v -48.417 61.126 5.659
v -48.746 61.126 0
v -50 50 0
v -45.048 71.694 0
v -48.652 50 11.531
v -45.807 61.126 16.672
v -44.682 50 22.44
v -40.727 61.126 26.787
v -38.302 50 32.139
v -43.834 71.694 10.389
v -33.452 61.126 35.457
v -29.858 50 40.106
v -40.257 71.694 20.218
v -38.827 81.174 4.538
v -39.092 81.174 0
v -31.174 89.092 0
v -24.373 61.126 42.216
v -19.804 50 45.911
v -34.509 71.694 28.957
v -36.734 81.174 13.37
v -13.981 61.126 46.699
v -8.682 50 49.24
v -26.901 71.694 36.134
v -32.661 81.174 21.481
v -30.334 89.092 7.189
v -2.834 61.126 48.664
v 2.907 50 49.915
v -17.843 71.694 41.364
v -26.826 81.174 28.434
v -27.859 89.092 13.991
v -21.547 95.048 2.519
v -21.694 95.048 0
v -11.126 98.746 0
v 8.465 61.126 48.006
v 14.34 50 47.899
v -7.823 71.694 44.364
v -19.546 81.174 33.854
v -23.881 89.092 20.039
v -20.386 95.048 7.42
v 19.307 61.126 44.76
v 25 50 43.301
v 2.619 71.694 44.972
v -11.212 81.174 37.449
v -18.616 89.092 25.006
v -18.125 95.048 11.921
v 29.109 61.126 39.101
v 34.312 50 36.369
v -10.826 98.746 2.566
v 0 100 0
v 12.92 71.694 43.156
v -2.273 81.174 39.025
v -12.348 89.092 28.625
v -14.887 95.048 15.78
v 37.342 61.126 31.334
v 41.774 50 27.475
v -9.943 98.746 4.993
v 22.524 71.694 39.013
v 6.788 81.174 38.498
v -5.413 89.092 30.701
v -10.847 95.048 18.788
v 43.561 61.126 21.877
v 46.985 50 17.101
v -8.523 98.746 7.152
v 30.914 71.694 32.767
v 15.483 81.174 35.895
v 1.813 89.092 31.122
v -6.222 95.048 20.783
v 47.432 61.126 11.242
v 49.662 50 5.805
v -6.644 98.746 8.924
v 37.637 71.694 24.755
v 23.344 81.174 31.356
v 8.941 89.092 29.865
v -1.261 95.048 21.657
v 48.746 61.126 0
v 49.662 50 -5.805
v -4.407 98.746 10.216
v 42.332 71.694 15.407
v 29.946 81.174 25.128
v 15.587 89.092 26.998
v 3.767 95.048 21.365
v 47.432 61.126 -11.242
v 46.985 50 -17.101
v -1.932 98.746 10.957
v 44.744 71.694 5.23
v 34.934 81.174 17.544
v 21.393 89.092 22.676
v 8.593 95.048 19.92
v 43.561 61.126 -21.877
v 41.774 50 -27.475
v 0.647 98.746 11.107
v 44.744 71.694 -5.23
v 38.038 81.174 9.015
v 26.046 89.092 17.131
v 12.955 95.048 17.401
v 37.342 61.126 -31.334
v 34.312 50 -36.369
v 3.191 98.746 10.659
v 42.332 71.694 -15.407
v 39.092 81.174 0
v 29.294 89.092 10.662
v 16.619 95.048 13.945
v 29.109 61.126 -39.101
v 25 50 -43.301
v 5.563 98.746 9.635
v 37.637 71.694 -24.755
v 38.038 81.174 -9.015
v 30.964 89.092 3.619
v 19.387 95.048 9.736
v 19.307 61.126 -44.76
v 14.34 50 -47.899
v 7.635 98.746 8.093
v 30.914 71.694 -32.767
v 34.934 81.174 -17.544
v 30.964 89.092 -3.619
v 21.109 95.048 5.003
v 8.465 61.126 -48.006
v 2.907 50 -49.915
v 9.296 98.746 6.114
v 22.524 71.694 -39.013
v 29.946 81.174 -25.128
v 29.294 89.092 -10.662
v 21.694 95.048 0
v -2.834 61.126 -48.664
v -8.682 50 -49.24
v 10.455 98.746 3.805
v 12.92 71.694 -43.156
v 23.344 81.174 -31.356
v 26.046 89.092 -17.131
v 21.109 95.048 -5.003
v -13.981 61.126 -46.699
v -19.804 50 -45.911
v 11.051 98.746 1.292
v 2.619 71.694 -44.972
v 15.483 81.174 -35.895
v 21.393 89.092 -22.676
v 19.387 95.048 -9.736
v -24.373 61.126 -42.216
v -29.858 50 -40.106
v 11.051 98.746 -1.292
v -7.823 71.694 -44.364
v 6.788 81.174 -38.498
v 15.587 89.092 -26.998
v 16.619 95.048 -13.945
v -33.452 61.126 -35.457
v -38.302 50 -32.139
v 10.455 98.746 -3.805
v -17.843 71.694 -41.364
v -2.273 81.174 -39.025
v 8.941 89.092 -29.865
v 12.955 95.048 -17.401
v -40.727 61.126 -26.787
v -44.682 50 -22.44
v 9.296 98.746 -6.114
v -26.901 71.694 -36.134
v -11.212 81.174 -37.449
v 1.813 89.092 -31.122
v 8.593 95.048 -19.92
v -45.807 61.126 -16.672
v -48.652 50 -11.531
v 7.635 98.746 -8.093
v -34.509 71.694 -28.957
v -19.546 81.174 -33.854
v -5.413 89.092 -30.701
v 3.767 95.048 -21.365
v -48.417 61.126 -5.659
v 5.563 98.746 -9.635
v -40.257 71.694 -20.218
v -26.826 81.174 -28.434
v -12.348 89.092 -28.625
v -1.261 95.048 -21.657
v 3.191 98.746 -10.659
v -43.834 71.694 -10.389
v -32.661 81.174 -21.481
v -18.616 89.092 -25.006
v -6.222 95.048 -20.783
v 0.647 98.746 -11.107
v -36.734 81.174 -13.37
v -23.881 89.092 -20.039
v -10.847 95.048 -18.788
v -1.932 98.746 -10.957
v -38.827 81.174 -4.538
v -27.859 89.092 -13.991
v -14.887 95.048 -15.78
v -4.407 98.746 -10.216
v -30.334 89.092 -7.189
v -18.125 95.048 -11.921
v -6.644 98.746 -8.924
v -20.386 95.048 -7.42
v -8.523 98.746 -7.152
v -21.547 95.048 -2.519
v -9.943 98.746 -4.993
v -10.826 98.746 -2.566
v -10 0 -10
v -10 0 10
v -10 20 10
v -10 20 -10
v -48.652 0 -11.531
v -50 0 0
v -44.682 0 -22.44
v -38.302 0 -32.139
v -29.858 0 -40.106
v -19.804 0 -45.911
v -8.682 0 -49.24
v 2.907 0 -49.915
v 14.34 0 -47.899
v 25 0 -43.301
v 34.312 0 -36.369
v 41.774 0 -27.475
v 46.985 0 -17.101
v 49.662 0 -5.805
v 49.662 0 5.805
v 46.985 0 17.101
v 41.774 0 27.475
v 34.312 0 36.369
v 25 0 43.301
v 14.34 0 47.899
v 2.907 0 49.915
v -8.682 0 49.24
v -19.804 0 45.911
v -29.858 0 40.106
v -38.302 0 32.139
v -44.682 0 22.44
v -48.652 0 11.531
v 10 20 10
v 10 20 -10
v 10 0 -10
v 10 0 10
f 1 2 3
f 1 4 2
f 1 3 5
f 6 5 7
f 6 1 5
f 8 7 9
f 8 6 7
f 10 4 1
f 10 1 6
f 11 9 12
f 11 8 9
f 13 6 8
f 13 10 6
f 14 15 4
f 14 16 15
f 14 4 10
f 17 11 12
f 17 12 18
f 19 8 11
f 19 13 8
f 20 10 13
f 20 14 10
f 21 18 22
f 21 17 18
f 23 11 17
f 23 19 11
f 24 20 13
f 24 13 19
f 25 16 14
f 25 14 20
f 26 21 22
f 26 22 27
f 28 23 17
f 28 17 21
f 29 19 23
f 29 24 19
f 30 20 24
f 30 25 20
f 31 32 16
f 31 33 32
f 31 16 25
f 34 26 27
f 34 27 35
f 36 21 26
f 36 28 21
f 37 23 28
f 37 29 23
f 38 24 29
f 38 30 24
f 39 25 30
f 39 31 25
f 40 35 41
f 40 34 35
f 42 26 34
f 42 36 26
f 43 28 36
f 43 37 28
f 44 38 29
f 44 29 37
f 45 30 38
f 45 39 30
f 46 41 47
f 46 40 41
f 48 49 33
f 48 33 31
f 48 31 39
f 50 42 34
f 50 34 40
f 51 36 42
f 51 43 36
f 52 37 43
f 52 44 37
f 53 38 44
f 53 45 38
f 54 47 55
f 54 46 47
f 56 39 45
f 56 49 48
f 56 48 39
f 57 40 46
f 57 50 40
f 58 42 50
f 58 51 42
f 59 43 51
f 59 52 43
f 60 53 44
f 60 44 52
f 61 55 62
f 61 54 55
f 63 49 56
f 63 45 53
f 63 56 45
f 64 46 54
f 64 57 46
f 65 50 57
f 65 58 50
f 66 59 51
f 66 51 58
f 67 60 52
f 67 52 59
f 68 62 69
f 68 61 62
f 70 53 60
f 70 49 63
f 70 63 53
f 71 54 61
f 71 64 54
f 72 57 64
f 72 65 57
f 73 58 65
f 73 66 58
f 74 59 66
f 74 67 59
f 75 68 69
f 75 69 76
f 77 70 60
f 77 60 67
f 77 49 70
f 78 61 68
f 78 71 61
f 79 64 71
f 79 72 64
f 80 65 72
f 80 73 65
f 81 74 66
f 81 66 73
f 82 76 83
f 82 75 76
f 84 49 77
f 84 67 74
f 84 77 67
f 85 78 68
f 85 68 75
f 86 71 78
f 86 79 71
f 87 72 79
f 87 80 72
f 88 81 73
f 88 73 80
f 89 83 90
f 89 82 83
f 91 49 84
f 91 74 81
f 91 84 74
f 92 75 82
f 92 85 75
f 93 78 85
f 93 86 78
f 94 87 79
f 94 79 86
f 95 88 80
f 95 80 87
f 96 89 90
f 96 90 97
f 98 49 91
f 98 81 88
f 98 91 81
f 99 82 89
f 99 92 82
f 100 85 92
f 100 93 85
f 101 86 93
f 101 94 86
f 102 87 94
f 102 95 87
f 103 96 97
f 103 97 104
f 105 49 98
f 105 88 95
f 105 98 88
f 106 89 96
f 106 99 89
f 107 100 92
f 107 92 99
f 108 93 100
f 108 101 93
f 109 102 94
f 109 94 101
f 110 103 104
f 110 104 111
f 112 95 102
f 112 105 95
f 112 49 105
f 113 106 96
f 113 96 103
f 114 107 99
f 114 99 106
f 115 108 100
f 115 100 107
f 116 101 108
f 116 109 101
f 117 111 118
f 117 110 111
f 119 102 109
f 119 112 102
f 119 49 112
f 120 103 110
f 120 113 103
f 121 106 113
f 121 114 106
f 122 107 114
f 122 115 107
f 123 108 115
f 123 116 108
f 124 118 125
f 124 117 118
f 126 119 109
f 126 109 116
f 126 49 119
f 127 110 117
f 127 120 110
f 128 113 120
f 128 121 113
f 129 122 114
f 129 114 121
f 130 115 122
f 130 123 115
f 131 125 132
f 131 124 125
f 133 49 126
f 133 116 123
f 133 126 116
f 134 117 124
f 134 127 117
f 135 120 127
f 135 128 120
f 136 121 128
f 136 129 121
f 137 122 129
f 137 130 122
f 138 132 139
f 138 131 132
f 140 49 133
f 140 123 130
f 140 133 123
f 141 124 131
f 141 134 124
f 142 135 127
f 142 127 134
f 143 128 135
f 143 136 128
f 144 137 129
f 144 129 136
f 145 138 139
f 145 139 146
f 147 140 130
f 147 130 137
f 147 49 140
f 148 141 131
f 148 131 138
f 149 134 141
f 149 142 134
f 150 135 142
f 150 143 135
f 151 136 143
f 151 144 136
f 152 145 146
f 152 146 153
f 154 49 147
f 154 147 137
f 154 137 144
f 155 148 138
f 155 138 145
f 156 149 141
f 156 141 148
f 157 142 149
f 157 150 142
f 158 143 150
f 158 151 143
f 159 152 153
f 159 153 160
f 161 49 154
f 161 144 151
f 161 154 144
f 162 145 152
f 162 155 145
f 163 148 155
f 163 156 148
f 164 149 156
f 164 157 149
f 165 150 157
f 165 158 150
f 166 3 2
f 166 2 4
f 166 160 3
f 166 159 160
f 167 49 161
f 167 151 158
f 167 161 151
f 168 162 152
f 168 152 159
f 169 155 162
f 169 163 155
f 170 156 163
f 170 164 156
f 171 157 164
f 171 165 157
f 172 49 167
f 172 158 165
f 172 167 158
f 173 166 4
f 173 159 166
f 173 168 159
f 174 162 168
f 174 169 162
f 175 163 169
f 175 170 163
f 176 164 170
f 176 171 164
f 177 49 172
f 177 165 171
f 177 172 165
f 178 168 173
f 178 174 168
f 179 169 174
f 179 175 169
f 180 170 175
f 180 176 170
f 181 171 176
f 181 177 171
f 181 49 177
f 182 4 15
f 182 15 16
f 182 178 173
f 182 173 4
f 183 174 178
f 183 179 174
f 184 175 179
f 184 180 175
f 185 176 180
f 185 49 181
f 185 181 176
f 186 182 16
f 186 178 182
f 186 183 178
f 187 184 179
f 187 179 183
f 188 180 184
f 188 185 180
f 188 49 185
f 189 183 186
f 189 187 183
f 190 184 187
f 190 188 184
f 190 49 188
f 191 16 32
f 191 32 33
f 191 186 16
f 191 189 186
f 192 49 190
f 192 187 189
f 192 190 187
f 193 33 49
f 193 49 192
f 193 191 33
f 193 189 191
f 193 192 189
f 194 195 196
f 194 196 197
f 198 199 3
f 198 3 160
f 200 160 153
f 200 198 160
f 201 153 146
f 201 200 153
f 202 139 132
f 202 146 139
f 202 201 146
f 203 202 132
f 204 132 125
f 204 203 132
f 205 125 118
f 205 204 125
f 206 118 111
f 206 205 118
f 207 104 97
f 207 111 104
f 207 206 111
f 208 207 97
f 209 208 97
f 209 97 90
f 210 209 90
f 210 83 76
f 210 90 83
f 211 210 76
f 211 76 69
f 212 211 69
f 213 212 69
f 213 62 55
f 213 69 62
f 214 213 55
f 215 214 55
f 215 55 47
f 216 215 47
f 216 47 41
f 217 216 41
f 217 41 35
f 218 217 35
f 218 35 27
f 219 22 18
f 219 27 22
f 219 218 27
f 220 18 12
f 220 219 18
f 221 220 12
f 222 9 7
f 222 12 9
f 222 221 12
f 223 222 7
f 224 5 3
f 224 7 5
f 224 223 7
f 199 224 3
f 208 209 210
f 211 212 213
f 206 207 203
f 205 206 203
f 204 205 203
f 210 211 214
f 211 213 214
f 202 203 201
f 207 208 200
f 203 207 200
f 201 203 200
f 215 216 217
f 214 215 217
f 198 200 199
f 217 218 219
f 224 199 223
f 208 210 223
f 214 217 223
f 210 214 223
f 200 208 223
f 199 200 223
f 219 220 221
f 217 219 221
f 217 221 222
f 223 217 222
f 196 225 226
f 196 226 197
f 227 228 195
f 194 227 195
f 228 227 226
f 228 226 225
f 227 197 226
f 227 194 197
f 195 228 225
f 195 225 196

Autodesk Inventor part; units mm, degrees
ref_plane "YZ Plane" through (0, 0, 0) normal (1, 0, 0) x (0, 1, 0)
ref_plane "XZ Plane" through (0, 0, 0) normal (0, 1, 0) x (-1, 0, 0)
ref_plane "XY Plane" through (0, 0, 0) normal (0, 0, 1) x (1, 0, 0)
sketch "Sketch1" plane through (0, 0, 0) normal (0, 1, 0) x (-1, 0, 0)
  line L0 (-10, 10) -> (10, 10)
  line L1 (10, 10) -> (10, -10)
  line L2 (10, -10) -> (-10, -10)
  line L3 (-10, -10) -> (-10, 10)
  line L4 (-10, 10) -> (10, -10) construction
  line L5 (10, 10) -> (-10, -10) construction
  point P0 (0, 0)
  dimension "d6" = 20
  dimension "d7" = 20
extrude "Extrusion1" add sketch "Sketch1" along normal blind 20
sketch "Sketch2" plane through (0, 0, 0) normal (0, 1, 0) x (-1, 0, 0)
  circle A0 centre (0, 0) radius 50
  dimension "d8" = 100
extrude "Extrusion2" add sketch "Sketch2" along normal blind 100 separate body
fillet "Fillet1" radius 50 1 edges at (50, 100, 0)
equation "\"d1\" = d7"
equation "\"d9\" = d8"
equation "\"d11\" = 0.5 * d8"
properties part number "shore-A-test-block"
